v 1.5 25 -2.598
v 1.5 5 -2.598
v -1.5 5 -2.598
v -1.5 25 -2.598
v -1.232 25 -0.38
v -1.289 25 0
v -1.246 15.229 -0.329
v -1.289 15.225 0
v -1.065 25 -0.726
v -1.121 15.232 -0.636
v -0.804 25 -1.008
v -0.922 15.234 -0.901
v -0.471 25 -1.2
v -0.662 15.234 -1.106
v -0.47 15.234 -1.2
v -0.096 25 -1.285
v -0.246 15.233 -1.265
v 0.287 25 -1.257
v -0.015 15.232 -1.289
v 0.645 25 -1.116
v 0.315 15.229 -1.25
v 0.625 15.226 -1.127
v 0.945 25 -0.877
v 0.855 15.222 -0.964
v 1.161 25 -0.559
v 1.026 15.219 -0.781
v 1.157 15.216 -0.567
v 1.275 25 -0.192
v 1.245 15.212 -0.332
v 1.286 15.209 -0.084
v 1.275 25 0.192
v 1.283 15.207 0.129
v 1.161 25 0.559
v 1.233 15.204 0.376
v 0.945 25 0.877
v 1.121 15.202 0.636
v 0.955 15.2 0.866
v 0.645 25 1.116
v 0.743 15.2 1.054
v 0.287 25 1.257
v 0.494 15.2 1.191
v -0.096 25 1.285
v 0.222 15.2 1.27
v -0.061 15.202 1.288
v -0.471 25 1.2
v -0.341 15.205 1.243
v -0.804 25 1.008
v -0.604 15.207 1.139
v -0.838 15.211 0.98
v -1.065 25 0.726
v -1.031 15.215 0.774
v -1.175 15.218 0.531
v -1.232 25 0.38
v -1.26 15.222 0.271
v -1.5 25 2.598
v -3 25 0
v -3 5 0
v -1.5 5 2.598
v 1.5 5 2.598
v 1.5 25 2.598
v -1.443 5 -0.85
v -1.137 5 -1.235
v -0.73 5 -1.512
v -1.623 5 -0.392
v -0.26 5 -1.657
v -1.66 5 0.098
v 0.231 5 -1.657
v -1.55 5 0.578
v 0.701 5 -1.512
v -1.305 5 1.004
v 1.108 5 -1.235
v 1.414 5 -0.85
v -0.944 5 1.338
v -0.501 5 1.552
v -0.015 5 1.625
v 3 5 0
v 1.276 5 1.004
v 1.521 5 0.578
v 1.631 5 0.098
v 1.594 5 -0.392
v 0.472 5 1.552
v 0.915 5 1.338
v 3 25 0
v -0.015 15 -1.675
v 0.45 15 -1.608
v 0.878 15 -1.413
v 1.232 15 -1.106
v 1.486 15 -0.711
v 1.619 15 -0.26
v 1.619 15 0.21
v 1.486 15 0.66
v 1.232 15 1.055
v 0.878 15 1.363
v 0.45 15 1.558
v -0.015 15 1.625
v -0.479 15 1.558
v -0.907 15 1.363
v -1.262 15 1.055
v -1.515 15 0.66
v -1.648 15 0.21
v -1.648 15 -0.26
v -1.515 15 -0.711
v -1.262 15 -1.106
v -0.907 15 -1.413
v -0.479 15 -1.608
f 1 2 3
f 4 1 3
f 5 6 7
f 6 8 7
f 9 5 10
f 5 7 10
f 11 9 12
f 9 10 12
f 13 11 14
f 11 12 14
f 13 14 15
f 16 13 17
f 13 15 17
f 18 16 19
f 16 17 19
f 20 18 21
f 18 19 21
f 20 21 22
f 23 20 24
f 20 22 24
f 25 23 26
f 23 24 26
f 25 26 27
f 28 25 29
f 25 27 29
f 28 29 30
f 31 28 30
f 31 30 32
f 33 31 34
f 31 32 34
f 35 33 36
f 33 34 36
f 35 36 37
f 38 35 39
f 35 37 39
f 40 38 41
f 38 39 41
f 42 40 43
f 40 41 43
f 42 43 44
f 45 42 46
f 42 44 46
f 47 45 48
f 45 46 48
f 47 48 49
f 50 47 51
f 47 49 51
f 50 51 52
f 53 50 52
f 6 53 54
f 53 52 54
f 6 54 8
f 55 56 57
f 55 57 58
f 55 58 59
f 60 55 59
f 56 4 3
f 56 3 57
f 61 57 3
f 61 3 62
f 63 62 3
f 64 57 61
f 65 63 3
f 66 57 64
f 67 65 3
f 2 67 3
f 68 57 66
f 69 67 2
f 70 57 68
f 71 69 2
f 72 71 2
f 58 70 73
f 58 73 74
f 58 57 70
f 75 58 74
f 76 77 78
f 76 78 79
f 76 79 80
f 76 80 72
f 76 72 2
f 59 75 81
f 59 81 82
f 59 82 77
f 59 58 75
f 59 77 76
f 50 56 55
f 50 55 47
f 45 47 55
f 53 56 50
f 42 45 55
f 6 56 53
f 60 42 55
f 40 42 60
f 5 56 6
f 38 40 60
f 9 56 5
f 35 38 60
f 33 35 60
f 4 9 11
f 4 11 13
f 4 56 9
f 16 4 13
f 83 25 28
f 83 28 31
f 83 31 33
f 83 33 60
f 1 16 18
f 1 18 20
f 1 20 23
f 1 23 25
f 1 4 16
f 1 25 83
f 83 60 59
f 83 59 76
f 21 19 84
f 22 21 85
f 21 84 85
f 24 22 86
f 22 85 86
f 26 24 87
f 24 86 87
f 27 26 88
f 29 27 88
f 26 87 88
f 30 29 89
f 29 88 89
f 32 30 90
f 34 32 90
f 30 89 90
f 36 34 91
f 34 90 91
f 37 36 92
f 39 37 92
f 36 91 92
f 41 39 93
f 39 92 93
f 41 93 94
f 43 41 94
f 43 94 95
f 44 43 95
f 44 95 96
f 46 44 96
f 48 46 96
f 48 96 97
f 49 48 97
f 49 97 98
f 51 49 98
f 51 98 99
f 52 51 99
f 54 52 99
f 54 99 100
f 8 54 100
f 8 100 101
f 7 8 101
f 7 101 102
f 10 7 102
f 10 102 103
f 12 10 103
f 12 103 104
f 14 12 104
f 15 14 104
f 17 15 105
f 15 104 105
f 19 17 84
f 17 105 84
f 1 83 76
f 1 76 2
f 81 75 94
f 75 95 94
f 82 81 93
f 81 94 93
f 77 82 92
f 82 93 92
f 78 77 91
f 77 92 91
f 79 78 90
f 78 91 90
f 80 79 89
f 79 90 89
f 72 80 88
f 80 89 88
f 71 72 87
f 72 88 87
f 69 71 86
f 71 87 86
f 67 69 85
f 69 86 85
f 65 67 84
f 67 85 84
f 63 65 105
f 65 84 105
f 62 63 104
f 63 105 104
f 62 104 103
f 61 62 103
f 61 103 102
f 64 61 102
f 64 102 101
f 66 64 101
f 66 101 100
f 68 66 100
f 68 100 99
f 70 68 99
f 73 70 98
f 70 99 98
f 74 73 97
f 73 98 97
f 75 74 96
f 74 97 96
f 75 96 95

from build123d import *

# Parameters (mm, degrees)
BOSS_EXTRUDE1_DEPTH             = 30
F_5_40_TAPPED_HOLE1_D           = 2.5781
F_5_40_TAPPED_HOLE1_DEPTH       = 15
F_5_40_TAPPED_HOLE1_CSINK_D     = 4.445
F_5_40_TAPPED_HOLE1_CSINK_ANGLE = 100
F_5_40_TAPPED_HOLE1_TIP         = 0.774539381
M4X0_7_TAPPED_HOLE1_D           = 3.3
M4X0_7_TAPPED_HOLE1_DEPTH       = 15
M4X0_7_TAPPED_HOLE1_TIP         = 0.991420021
SKETCH9_R                       = 3
CUT_EXTRUDE2_DEPTH              = 5
SKETCH10_R                      = 3
CUT_EXTRUDE3_DEPTH              = 5


with BuildPart() as part:
    # Sketch2 → Boss-Extrude1 (new body)
    with BuildSketch(Plane(origin=(0, 0, 0), x_dir=(1, 0, 0), z_dir=(0, 1, 0))):
        Polygon((3, 0), (1.5, 2.598076211), (-1.5, 2.598076211), (-3, 0), (-1.5, -2.598076211), (1.5, -2.598076211), align=None)
    extrude(amount=BOSS_EXTRUDE1_DEPTH)

    # #5-40 Tapped Hole1
    with Locations(Plane(origin=(0, 30, 0), x_dir=(1, 0, 0), z_dir=(0, 1, 0))):
        with Locations((0, 0)):
            CounterSinkHole(F_5_40_TAPPED_HOLE1_D / 2, F_5_40_TAPPED_HOLE1_CSINK_D / 2, depth=F_5_40_TAPPED_HOLE1_DEPTH, counter_sink_angle=F_5_40_TAPPED_HOLE1_CSINK_ANGLE)
            with Locations((0, 0, -(F_5_40_TAPPED_HOLE1_DEPTH + F_5_40_TAPPED_HOLE1_TIP / 2))):  # 118° drill point
                Cone(0, F_5_40_TAPPED_HOLE1_D / 2, F_5_40_TAPPED_HOLE1_TIP, mode=Mode.SUBTRACT)

    # M4x0.7 Tapped Hole1
    with Locations(Plane(origin=(-0.014516339, 0, -0.025143037), x_dir=(0, 0, -1), z_dir=(0, -1, 0))):
        with Locations((0, 0)):
            Hole(M4X0_7_TAPPED_HOLE1_D / 2, depth=M4X0_7_TAPPED_HOLE1_DEPTH)
            with Locations((0, 0, -(M4X0_7_TAPPED_HOLE1_DEPTH + M4X0_7_TAPPED_HOLE1_TIP / 2))):  # 118° drill point
                Cone(0, M4X0_7_TAPPED_HOLE1_D / 2, M4X0_7_TAPPED_HOLE1_TIP, mode=Mode.SUBTRACT)

    # Sketch9 → Cut-Extrude2 (cut)
    with BuildSketch(Plane(origin=(0, 30, 0), x_dir=(1, 0, 0), z_dir=(0, 1, 0))):
        Circle(SKETCH9_R)
    extrude(amount=-CUT_EXTRUDE2_DEPTH, mode=Mode.SUBTRACT)

    # Sketch10 → Cut-Extrude3 (cut)
    with BuildSketch(Plane.XZ):
        Circle(SKETCH10_R)
    extrude(amount=-CUT_EXTRUDE3_DEPTH, mode=Mode.SUBTRACT)


solid = part.part
